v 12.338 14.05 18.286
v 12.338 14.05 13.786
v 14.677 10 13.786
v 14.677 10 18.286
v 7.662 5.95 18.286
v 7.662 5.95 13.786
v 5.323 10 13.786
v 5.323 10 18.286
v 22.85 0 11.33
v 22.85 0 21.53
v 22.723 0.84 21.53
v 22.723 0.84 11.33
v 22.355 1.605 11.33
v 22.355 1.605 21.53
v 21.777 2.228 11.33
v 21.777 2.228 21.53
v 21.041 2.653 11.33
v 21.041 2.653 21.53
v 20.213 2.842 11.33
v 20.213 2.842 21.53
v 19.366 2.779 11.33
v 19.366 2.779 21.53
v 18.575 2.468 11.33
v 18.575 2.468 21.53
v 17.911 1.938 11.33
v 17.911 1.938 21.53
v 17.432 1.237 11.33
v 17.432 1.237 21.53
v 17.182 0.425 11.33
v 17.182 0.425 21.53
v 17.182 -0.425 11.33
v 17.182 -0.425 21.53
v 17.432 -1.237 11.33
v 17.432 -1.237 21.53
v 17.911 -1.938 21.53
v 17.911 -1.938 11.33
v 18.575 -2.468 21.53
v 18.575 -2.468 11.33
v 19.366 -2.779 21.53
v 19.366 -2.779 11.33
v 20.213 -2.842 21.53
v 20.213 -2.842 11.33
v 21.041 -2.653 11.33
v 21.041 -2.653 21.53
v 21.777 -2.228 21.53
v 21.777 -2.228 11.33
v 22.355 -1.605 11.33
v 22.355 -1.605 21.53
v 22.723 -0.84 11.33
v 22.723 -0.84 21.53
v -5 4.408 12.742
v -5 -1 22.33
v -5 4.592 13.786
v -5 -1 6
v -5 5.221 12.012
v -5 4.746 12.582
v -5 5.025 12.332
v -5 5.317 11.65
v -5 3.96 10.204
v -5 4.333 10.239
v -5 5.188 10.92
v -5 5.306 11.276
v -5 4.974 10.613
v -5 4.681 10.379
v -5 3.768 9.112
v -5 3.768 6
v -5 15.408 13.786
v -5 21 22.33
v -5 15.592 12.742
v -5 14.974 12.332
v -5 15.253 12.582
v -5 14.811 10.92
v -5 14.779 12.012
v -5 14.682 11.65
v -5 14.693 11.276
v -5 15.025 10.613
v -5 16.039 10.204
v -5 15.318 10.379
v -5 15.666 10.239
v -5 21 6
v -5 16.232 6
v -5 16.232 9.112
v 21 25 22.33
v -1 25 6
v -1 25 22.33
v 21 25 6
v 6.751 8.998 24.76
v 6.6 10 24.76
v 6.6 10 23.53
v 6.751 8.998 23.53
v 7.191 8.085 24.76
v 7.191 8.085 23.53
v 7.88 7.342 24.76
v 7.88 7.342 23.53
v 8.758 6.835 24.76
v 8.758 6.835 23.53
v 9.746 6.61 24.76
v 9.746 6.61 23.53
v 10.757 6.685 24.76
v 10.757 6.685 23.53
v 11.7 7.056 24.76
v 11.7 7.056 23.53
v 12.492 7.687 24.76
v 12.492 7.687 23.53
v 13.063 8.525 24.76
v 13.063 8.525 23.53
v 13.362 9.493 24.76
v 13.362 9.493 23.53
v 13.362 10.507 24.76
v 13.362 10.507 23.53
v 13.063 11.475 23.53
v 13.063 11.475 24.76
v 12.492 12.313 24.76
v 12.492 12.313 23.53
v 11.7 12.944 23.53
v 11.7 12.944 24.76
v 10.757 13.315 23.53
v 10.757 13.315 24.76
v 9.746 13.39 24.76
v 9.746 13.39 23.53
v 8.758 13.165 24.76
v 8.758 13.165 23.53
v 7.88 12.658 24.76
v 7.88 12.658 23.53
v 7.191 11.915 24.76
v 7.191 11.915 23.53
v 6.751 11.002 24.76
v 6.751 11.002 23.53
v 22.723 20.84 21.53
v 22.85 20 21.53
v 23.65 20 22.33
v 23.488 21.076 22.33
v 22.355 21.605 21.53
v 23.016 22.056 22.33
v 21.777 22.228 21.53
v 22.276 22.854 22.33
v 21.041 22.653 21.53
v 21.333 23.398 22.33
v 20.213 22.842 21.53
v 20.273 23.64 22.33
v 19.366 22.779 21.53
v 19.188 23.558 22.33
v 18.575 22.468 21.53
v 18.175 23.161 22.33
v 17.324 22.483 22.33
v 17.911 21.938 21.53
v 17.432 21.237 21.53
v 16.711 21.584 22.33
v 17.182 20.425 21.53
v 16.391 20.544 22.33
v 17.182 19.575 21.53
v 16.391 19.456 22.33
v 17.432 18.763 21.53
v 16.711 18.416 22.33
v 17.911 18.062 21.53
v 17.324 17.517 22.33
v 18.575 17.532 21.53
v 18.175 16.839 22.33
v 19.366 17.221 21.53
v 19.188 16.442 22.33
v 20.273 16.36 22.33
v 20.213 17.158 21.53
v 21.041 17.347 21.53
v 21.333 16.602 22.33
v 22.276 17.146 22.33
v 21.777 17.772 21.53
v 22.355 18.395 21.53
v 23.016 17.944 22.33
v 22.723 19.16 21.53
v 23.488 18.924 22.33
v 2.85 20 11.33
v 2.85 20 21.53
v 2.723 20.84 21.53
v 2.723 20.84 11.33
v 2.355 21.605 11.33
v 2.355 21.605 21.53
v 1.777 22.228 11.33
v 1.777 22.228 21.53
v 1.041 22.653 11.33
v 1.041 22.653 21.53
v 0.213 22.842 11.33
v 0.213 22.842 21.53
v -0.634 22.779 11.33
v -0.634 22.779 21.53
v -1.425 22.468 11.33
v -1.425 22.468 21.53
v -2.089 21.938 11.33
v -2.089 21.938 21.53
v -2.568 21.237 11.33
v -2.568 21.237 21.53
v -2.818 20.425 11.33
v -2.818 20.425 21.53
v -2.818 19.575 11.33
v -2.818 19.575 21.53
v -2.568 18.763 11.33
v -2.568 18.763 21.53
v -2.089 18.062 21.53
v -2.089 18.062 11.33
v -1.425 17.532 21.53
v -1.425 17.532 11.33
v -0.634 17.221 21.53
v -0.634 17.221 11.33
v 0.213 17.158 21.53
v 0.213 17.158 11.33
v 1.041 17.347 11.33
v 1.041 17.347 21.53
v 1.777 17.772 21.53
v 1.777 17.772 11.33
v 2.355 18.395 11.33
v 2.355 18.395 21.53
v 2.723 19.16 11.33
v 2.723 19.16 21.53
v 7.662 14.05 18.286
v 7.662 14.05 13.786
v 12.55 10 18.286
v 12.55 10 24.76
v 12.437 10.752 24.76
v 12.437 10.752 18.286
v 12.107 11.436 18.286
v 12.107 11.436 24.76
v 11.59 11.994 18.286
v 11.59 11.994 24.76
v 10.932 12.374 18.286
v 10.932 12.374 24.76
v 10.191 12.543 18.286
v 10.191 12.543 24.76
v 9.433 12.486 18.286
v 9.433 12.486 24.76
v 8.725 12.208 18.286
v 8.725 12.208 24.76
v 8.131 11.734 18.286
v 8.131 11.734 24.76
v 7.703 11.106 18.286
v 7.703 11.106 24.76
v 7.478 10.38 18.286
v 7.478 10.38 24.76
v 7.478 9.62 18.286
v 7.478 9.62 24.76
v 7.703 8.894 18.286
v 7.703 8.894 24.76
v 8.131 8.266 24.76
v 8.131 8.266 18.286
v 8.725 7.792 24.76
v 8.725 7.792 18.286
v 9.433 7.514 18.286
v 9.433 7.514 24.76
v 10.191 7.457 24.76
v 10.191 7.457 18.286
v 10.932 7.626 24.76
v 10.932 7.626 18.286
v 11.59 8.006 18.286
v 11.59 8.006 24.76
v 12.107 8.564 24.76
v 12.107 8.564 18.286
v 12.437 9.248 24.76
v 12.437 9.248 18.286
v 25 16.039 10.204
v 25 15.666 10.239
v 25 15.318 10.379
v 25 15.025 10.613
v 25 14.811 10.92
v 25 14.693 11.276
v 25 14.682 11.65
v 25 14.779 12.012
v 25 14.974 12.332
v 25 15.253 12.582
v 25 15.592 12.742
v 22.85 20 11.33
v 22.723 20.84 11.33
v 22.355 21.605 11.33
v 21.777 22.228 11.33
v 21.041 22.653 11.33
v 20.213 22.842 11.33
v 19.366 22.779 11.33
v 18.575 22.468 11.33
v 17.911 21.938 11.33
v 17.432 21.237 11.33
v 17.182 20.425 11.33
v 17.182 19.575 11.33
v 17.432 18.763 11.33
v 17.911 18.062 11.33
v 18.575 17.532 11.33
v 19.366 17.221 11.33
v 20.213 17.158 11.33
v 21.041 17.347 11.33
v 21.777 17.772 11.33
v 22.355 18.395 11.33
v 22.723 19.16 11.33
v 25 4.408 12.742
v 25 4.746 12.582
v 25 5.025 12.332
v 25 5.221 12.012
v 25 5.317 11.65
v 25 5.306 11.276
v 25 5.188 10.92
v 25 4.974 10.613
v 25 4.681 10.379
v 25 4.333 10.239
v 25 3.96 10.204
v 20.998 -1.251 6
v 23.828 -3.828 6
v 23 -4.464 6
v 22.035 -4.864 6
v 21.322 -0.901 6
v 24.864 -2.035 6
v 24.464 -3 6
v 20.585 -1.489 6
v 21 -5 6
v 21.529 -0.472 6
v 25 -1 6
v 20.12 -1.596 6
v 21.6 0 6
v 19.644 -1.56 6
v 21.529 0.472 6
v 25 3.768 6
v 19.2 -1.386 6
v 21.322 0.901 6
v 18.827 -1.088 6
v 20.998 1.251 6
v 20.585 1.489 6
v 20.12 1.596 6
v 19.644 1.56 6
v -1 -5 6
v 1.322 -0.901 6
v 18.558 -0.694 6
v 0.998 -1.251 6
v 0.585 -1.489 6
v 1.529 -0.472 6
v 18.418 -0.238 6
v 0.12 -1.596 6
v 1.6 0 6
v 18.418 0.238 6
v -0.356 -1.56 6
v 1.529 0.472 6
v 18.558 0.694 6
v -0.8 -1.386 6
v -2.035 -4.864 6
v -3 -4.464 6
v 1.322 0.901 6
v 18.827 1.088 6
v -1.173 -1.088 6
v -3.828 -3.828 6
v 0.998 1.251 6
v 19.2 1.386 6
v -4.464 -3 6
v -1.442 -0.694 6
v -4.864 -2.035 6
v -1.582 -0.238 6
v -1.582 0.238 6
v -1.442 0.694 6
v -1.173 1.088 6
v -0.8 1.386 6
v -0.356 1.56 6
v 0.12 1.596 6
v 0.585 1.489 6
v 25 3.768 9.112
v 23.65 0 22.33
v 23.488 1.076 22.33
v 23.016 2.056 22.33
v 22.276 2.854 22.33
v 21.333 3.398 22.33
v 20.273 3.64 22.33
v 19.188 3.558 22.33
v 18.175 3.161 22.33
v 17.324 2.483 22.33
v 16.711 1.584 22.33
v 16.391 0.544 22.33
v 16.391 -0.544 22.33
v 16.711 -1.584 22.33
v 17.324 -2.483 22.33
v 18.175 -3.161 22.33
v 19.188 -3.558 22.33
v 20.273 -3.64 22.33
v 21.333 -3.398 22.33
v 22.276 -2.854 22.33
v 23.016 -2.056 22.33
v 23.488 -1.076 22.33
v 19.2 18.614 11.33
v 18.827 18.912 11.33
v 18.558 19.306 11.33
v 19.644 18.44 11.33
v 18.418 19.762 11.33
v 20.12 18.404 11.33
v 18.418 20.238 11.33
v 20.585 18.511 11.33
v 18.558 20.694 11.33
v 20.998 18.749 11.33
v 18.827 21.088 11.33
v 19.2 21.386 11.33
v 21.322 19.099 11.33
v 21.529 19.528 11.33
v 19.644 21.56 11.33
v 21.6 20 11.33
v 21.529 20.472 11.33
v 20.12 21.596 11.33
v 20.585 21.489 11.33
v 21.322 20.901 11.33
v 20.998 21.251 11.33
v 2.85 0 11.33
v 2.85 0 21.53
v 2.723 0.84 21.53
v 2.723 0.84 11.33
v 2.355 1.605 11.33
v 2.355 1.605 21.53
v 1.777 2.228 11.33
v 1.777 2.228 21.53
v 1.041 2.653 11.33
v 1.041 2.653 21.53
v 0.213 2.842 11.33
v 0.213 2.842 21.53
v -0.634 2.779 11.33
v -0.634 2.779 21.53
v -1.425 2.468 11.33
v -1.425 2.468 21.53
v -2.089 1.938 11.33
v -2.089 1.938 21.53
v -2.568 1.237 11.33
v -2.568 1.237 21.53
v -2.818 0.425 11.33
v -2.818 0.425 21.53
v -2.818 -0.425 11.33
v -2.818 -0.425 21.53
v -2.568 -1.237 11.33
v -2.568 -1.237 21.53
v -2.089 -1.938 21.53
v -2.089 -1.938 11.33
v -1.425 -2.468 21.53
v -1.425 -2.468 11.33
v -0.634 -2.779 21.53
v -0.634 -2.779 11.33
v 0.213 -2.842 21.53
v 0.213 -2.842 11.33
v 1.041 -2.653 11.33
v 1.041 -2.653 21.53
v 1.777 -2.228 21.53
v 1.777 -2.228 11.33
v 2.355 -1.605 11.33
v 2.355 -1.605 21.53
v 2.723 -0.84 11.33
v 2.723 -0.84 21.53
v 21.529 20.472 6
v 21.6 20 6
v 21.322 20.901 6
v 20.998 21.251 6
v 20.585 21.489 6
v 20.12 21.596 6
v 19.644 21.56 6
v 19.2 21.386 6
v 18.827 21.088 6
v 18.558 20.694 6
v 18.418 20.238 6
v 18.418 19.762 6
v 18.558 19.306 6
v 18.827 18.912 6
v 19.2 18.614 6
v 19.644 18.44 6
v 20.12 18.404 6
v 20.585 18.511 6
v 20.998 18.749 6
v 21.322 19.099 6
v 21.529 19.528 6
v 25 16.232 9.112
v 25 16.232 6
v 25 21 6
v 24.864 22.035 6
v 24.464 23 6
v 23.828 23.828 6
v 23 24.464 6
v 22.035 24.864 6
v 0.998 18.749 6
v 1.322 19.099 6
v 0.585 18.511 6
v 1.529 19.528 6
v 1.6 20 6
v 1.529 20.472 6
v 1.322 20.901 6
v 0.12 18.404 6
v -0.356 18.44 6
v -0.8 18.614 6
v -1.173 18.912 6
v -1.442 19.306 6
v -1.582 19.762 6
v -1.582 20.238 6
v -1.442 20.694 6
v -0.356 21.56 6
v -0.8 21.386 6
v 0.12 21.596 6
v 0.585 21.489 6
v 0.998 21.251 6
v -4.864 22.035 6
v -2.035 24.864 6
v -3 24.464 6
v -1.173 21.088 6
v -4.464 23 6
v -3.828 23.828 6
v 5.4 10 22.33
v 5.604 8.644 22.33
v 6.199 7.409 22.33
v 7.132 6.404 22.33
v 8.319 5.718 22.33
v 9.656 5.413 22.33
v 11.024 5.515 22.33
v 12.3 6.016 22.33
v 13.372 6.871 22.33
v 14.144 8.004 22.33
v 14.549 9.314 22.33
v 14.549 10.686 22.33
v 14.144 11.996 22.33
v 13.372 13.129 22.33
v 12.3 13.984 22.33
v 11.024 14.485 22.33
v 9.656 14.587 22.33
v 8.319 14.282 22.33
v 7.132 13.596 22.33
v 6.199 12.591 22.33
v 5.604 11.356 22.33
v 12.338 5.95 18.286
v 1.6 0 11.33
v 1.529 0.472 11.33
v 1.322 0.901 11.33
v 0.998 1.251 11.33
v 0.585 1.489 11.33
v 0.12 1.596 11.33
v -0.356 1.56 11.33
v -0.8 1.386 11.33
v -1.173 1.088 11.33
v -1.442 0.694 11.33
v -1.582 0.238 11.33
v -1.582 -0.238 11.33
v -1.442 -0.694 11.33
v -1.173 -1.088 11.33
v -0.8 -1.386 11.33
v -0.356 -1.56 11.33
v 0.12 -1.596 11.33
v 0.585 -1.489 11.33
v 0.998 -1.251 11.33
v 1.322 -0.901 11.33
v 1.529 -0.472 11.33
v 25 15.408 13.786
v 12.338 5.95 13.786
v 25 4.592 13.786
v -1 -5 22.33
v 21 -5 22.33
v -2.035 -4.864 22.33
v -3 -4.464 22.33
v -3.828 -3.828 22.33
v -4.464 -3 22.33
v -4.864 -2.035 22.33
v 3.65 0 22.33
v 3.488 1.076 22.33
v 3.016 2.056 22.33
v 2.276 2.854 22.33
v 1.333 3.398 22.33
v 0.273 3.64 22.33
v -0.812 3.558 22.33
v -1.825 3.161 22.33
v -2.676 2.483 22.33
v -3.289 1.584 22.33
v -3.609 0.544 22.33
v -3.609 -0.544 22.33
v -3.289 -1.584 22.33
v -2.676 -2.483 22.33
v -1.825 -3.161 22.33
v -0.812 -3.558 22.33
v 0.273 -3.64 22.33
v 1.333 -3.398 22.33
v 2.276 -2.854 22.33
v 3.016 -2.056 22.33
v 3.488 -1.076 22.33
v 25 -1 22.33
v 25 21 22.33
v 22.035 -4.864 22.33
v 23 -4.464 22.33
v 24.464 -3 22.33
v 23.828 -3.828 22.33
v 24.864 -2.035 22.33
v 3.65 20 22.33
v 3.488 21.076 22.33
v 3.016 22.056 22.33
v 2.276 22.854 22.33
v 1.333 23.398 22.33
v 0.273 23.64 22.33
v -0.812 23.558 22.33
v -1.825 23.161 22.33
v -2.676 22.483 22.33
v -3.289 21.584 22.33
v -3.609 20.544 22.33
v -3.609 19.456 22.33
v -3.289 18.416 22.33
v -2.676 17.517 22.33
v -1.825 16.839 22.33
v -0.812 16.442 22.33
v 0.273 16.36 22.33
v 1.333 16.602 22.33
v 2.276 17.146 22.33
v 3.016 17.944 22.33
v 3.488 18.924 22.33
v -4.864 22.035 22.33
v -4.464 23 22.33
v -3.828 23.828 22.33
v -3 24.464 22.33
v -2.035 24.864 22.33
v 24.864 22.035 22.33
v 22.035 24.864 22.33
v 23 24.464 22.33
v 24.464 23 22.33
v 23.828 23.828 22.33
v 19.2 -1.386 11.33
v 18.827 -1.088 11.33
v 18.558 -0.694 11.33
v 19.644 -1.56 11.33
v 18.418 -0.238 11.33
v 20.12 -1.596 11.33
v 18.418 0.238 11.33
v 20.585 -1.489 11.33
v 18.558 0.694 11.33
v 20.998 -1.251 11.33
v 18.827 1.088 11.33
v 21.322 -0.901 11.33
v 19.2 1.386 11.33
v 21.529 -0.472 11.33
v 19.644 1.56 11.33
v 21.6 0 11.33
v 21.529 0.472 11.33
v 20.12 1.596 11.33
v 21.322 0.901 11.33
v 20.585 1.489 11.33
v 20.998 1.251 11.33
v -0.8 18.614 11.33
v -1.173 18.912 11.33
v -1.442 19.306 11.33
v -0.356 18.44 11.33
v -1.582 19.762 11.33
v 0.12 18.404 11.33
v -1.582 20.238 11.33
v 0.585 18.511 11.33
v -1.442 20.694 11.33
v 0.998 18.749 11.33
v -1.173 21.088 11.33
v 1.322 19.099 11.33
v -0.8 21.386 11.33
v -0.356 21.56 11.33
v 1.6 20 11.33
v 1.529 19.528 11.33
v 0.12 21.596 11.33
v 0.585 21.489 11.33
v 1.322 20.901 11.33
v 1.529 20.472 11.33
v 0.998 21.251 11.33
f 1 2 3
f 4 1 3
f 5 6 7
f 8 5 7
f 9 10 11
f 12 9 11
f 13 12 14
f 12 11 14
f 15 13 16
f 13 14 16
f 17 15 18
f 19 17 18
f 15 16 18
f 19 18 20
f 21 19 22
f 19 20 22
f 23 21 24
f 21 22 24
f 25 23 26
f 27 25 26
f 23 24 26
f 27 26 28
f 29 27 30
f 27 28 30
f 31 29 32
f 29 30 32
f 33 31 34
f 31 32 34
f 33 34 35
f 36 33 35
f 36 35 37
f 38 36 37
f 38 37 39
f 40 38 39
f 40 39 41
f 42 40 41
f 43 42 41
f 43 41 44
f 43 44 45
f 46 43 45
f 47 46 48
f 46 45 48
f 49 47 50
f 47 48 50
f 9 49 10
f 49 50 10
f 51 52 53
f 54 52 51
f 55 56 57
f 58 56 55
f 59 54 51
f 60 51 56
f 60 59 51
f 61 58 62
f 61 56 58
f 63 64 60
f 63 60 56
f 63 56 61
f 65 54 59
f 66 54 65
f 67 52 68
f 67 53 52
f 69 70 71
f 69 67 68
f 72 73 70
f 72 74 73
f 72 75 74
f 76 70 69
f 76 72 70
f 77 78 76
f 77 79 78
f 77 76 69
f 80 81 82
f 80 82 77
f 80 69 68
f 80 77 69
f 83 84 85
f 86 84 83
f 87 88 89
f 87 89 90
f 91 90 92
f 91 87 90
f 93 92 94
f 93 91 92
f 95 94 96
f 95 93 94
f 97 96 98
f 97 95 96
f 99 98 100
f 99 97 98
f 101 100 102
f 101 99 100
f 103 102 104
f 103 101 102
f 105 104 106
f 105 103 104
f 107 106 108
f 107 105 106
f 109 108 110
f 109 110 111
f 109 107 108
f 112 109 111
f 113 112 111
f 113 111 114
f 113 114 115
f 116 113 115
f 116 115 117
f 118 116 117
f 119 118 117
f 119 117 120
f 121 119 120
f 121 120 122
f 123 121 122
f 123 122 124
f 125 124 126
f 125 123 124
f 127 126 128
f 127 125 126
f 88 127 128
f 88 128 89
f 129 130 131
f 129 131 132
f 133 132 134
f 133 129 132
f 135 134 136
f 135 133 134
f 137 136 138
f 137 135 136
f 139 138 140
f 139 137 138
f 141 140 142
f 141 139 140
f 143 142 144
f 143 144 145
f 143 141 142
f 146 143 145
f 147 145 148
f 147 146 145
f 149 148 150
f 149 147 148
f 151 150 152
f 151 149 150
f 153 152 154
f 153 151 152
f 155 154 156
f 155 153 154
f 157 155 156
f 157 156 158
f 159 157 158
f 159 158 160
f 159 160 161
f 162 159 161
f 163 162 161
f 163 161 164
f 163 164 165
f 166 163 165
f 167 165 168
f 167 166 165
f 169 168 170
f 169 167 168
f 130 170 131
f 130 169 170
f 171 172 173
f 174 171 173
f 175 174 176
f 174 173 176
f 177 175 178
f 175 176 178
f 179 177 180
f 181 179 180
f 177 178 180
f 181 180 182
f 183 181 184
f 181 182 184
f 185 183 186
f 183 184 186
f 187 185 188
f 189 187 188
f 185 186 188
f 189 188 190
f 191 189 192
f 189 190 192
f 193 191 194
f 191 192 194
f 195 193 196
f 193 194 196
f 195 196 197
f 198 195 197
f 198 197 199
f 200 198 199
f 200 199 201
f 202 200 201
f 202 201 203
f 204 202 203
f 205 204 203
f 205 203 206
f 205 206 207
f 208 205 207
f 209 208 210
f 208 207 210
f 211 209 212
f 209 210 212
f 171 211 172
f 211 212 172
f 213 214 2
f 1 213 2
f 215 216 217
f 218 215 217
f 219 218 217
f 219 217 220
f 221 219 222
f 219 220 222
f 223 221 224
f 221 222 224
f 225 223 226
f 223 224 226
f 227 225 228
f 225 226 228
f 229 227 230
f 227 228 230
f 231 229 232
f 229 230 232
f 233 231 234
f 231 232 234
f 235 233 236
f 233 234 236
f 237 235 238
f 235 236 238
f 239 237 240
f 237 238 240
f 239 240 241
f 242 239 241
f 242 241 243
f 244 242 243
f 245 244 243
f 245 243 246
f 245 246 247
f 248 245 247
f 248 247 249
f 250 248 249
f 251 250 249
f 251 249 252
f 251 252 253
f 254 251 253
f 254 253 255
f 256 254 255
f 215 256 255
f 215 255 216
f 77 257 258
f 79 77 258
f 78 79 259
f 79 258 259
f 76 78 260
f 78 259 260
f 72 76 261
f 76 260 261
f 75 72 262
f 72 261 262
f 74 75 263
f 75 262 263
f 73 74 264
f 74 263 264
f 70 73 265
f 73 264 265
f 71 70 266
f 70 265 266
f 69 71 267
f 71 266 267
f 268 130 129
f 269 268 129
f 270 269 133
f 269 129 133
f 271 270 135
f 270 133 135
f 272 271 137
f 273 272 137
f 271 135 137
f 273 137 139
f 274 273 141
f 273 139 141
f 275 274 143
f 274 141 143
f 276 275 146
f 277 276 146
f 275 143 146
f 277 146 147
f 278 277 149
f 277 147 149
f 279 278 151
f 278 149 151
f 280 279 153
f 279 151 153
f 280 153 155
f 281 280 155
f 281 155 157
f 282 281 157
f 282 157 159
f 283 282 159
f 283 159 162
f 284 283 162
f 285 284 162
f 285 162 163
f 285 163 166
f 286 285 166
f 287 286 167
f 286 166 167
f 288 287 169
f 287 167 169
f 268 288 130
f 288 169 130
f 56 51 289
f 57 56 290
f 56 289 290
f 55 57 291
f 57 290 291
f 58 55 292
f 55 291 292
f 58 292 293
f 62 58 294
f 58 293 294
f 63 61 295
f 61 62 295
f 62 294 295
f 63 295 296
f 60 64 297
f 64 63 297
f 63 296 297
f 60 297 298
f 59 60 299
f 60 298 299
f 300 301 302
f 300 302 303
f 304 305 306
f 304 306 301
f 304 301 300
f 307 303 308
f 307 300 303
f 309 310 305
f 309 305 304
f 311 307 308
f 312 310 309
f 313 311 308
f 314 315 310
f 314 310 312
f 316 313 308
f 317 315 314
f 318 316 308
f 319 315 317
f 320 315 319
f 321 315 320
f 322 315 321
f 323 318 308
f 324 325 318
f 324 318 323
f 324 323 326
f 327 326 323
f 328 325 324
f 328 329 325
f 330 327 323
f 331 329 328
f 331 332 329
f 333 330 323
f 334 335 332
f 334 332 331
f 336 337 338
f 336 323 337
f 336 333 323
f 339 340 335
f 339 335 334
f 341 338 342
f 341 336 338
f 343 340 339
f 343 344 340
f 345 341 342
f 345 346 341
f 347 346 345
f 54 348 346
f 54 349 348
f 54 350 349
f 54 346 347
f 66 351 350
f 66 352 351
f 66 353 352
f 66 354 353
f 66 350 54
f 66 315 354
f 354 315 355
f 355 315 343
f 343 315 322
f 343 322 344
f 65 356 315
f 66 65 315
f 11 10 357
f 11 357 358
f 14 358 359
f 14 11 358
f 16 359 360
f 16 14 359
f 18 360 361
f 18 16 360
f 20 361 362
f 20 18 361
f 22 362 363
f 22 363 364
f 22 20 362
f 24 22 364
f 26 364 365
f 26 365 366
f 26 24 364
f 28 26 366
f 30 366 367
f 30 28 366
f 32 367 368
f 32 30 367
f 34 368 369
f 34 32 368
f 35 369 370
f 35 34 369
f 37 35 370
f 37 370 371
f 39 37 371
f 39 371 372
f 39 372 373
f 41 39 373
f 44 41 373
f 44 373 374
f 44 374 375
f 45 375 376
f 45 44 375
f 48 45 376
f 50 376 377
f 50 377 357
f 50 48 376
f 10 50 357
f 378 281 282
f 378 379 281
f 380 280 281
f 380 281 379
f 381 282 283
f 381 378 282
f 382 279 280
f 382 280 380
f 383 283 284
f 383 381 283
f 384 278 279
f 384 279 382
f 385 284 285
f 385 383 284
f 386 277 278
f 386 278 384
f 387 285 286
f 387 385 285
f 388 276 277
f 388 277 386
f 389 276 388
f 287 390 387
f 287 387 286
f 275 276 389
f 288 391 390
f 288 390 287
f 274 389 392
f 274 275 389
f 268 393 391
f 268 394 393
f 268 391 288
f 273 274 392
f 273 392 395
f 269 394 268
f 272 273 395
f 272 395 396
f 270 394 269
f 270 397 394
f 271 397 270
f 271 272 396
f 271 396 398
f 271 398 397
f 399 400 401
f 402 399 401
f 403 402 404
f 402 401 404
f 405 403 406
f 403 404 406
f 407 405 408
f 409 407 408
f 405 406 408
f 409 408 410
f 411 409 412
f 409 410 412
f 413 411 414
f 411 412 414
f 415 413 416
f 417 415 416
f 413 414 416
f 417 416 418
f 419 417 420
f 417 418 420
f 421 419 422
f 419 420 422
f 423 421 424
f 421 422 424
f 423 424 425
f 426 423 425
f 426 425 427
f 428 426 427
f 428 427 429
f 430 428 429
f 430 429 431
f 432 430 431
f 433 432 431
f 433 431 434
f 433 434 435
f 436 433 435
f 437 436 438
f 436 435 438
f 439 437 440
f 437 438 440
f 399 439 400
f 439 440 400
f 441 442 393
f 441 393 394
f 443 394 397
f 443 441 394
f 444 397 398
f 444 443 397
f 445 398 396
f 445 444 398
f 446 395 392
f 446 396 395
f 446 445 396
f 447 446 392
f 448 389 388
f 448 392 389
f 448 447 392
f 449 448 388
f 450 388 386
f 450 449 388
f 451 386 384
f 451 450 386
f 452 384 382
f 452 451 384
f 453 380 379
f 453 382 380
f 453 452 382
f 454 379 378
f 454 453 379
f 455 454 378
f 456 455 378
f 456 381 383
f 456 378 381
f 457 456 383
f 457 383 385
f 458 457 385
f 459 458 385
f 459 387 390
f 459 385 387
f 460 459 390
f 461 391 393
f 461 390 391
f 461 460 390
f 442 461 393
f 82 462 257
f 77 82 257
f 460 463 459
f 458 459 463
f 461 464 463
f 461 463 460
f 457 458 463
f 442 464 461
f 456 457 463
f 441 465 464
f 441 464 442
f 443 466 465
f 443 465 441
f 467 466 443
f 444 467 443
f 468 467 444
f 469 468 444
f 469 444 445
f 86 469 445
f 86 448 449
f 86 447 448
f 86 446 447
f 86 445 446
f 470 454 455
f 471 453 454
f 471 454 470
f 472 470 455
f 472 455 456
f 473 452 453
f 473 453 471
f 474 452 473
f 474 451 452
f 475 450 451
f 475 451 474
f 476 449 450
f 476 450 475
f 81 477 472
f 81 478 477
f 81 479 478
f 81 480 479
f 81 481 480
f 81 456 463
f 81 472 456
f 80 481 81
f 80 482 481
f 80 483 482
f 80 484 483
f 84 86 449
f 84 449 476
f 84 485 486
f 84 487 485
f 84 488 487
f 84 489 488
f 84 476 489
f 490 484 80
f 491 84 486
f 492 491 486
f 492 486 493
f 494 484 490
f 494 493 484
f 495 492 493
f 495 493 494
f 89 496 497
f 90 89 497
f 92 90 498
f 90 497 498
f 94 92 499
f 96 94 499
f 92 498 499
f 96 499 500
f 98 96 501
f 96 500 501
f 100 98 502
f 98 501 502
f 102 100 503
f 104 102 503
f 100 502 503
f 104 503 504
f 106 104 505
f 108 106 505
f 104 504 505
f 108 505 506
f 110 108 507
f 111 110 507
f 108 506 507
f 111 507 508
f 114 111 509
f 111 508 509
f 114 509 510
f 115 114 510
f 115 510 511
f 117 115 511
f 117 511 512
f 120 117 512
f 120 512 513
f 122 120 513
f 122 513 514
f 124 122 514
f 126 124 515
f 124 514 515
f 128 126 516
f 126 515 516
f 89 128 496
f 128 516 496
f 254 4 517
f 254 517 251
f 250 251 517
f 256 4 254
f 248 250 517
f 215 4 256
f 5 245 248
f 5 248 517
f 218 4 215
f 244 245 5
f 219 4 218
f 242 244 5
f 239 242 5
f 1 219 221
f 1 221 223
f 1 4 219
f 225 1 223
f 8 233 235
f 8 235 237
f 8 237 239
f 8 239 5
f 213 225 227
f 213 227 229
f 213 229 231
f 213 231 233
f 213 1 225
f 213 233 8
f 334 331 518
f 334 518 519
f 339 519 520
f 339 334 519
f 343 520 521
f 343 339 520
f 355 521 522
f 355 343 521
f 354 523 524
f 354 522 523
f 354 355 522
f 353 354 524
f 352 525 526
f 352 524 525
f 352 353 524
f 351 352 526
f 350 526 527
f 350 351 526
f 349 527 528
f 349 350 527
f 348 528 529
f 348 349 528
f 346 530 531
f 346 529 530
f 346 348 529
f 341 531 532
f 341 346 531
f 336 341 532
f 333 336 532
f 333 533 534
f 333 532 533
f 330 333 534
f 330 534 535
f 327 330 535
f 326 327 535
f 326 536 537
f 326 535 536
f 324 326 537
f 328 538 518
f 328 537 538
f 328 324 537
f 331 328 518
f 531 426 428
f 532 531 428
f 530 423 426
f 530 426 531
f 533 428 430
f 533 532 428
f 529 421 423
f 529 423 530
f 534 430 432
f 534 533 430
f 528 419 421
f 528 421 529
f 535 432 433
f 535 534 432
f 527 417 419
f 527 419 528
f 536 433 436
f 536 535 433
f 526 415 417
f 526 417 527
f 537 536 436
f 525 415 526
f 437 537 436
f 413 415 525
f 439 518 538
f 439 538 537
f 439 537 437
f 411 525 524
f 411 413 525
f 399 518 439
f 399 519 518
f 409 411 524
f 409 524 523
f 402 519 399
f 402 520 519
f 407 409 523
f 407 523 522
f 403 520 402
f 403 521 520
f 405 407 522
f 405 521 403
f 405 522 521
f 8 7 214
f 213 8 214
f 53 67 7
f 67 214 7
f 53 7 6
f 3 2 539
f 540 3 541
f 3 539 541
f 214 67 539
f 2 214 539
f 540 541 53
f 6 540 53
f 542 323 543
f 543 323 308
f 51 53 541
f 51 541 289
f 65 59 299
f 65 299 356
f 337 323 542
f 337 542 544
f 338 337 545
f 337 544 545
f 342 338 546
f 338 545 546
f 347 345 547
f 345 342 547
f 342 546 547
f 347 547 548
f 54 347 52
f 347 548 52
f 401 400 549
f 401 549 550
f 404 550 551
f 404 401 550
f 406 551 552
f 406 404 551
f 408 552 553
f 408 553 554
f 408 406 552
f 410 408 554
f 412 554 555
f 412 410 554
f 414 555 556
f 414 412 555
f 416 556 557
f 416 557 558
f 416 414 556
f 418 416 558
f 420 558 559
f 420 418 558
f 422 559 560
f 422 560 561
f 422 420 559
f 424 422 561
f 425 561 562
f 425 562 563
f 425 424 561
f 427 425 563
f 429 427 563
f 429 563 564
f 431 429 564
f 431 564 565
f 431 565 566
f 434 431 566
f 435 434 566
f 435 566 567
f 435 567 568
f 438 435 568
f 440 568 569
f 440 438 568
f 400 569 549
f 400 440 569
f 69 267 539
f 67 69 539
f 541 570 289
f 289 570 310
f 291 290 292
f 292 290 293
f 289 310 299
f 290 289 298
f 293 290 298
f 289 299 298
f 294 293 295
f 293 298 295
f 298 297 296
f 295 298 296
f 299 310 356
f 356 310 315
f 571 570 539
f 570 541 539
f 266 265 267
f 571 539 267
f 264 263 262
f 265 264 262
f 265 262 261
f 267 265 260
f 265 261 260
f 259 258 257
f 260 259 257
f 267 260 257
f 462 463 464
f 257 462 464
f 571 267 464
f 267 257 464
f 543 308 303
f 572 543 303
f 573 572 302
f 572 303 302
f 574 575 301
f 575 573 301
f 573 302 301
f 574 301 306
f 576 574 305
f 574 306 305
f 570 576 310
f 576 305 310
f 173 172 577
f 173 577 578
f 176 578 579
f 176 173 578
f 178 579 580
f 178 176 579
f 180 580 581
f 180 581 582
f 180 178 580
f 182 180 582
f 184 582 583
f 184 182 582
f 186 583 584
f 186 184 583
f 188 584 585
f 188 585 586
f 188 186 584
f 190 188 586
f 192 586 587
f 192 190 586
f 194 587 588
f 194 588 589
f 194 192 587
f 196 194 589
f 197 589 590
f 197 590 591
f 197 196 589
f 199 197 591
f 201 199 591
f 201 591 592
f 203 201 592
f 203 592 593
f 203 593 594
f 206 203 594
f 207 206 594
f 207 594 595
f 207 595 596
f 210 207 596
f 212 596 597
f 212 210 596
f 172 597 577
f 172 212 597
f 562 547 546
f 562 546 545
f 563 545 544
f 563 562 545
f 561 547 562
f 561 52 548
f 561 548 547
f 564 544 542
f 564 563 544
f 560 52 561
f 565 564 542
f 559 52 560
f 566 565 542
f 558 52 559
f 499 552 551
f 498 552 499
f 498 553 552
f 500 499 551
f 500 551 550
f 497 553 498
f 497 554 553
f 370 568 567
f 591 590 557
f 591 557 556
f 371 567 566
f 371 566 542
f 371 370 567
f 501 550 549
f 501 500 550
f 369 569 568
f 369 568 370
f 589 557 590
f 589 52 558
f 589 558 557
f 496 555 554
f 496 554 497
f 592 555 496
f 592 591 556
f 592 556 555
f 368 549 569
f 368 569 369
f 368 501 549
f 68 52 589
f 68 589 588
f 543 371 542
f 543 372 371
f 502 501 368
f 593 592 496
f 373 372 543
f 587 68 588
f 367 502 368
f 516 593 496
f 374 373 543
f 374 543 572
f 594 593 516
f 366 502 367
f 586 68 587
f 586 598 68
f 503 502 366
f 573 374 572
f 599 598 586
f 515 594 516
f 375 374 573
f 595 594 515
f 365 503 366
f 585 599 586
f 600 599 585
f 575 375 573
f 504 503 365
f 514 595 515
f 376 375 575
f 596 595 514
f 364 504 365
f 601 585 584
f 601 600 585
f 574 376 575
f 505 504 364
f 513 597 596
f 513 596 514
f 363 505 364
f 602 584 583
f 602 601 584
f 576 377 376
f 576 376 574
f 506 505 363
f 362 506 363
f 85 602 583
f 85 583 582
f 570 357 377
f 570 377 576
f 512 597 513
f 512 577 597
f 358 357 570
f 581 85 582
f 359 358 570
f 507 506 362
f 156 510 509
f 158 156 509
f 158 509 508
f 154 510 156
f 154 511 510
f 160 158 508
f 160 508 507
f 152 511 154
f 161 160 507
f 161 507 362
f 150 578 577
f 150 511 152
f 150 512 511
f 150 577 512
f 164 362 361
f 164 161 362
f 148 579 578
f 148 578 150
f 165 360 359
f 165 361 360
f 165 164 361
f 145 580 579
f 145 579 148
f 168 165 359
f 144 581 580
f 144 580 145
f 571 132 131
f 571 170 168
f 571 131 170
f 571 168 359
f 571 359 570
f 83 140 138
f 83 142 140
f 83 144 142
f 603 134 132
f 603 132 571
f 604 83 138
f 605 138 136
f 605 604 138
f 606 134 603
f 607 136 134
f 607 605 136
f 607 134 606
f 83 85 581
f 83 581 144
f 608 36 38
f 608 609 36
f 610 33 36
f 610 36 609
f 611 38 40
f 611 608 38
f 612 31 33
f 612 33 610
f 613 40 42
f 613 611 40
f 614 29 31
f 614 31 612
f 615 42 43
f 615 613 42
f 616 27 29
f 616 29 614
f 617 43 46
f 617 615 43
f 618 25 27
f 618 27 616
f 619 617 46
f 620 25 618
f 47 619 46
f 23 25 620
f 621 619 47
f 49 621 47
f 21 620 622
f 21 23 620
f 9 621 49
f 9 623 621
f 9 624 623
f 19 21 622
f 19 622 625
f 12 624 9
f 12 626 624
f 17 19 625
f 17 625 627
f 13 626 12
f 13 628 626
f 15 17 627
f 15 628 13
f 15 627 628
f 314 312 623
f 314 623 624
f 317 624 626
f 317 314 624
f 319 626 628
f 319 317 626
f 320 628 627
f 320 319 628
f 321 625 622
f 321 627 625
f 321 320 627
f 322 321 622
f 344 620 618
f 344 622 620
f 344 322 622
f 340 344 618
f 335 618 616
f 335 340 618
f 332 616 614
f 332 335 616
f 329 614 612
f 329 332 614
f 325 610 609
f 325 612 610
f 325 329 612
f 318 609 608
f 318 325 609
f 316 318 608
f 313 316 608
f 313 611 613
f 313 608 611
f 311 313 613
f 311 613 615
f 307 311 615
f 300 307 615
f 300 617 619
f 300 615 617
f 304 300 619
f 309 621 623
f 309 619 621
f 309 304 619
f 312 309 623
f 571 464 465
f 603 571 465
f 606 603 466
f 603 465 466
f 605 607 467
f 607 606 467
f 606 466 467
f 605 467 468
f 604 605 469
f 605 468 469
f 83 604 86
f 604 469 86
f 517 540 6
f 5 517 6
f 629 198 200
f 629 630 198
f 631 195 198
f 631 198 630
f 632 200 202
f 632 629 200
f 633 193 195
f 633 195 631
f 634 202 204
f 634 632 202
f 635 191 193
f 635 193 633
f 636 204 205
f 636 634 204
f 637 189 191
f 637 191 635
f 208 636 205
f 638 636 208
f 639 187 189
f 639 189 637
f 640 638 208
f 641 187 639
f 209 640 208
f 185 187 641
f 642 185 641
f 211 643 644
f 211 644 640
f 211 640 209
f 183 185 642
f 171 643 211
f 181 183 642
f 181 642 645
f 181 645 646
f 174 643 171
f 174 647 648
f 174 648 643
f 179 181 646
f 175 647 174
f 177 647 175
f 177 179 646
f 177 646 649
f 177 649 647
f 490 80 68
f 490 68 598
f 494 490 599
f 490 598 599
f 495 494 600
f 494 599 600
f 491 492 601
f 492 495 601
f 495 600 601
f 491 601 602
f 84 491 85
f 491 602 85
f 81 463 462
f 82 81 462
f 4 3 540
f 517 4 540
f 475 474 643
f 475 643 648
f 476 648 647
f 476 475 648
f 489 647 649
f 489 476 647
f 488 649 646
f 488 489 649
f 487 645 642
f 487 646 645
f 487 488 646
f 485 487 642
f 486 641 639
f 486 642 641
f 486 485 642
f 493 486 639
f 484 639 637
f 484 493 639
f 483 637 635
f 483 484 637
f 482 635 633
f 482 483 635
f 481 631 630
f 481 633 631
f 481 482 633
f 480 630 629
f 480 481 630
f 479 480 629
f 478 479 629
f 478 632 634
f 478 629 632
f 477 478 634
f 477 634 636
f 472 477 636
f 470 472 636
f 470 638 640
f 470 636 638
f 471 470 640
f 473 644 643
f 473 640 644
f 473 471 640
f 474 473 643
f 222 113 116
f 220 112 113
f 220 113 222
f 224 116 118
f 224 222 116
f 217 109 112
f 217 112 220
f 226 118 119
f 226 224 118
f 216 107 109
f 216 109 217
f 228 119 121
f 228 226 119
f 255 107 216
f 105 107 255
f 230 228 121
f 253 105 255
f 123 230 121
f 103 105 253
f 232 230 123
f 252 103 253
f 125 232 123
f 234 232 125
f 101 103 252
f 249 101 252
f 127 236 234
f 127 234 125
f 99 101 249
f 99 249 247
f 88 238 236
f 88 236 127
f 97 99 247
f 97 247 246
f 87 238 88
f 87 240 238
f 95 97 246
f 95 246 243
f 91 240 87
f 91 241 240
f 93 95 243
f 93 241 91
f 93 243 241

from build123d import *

# Parameters (mm, degrees)
SKETCH1_W                  = 30
SKETCH1_H                  = 30
SKETCH1_R                  = 1.6
SKETCH1_W_2                = 70
SKETCH1_H_2                = 12
BOSS_EXTRUDE1_DEPTH        = 6
SKETCH1_3_W                = 30
SKETCH1_3_H                = 30
SKETCH1_3_R                = 1.6
BOSS_EXTRUDE2_DEPTH        = 22.33
CUT_EXTRUDE1_DEPTH         = 78.612040947
SKETCH3_R                  = 2.55
CUT_EXTRUDE2_DEPTH         = 8
CUT_EXTRUDE3_DEPTH         = 4.5
SKETCH6_R                  = 5
CUT_EXTRUDE5_DEPTH         = 8.6
SKETCH7_R                  = 1.6
CUT_EXTRUDE6_DEPTH         = 101.740403513
SKETCH8_R                  = 2.85
CUT_EXTRUDE7_DEPTH         = 11
BOSS_EXTRUDE3_START        = 2.43
SKETCH9_R                  = 3.4
SKETCH9_R_2                = 2.55
BOSS_EXTRUDE3_DEPTH        = 2.43
CHAMFER1_SIZE              = 1.2
FILLET3_R                  = 4
CHAMFER2_SIZE              = 0.8
CUT_EXTRUDE8_DEPTH         = 3
CHAMFER3_SIZE              = 0.8
LPATTERN1_COUNT            = 3
LPATTERN1_PITCH            = 25
CHAMFER3_OF_LPATTERN1_SIZE = 0.8
SKETCH12_W                 = 103.210606925
SKETCH12_H                 = 33.832940417
CUT_EXTRUDE9_DEPTH         = 6


with BuildPart() as part:
    # Sketch1 → Boss-Extrude1 (new body)
    # profile 1 of 2: a face of its own
    with BuildSketch(Plane.XY):
        with Locations((10, 10)):
            Rectangle(SKETCH1_W, SKETCH1_H)
        with Locations((20, 0)):
            Circle(SKETCH1_R, mode=Mode.SUBTRACT)
        with Locations((20, 20)):
            Circle(SKETCH1_R, mode=Mode.SUBTRACT)
        with Locations((0, 20)):
            Circle(SKETCH1_R, mode=Mode.SUBTRACT)
        Circle(SKETCH1_R, mode=Mode.SUBTRACT)
    # profile 2 of 2: a face of its own
    with BuildSketch(Plane.XY):
        with Locations((60, 10)):
            Rectangle(SKETCH1_W_2, SKETCH1_H_2)
    extrude(amount=BOSS_EXTRUDE1_DEPTH)

    # Sketch1<3> → Boss-Extrude2 (add)
    with BuildSketch(Plane.XY):
        with Locations((10, 10)):
            Rectangle(SKETCH1_3_W, SKETCH1_3_H)
        with Locations((20, 0)):
            Circle(SKETCH1_3_R, mode=Mode.SUBTRACT)
        with Locations((20, 20)):
            Circle(SKETCH1_3_R, mode=Mode.SUBTRACT)
        with Locations((0, 20)):
            Circle(SKETCH1_3_R, mode=Mode.SUBTRACT)
        Circle(SKETCH1_3_R, mode=Mode.SUBTRACT)
    extrude(amount=BOSS_EXTRUDE2_DEPTH)

    # Sketch2 → Cut-Extrude1 (cut, through all)
    with BuildSketch(Plane(origin=(25, 0, 0), x_dir=(0, 0, -1), z_dir=(1, 0, 0))):
        with BuildLine():
            Line((-6.515476918, 16.231667643), (-9.112158418, 16.231667643))
            Line((-9.112158418, 16.231667643), (-10.20449761, 16.039058771))
            ThreePointArc((-10.20449761, 16.039058771), (-11.275650893, 14.693383456), (-12.742453793, 15.59154862))
            Line((-12.742453793, 15.59154862), (-13.786185118, 15.407510627))
            Line((-13.786185118, 15.407510627), (-13.786185118, 4.591753459))
            Line((-13.786185118, 4.591753459), (-12.742453793, 4.407715465))
            ThreePointArc((-12.742453793, 4.407715465), (-11.275650893, 5.305880629), (-10.20449761, 3.960205314))
            Line((-10.20449761, 3.960205314), (-9.112158418, 3.767596443))
            Line((-9.112158418, 3.767596443), (-6.515476918, 3.767596443))
            Line((-6.515476918, 3.767596443), (-5.902540869, 3.767596443))
            Line((-5.902540869, 3.767596443), (-5.902540869, 16.231667643))
            Line((-5.902540869, 16.231667643), (-6.515476918, 16.231667643))
        make_face()
    extrude(amount=-CUT_EXTRUDE1_DEPTH, mode=Mode.SUBTRACT)

    # Sketch3 → Cut-Extrude2 (cut)
    with BuildSketch(Plane.XY.offset(22.33)):
        with Locations((10, 10)):
            Circle(SKETCH3_R)
    extrude(amount=-CUT_EXTRUDE2_DEPTH, mode=Mode.SUBTRACT)

    # Sketch5 → Cut-Extrude3 (cut)
    with BuildSketch(Plane(origin=(0, 0, 13.786185118), x_dir=(-1, 0, 0), z_dir=(0, 0, -1))):
        Polygon((-5.32346282, 10), (-7.66173141, 14.05), (-12.33826859, 14.05), (-14.67653718, 10), (-12.33826859, 5.95), (-7.66173141, 5.95), align=None)
    extrude(amount=-CUT_EXTRUDE3_DEPTH, mode=Mode.SUBTRACT)

    # Sketch6 → Cut-Extrude5 (cut)
    with BuildSketch(Plane(origin=(0, 0, 0), x_dir=(-1, 0, 0), z_dir=(0, 0, -1))):
        with Locations((-10, 10)):
            Circle(SKETCH6_R)
    extrude(amount=-CUT_EXTRUDE5_DEPTH, mode=Mode.SUBTRACT)

    # Sketch7 → Cut-Extrude6 (cut, through all)
    with BuildSketch(Plane(origin=(0, 0, 0), x_dir=(-1, 0, 0), z_dir=(0, 0, -1))):
        with BuildLine():
            ThreePointArc((-90.1, 10), (-88.5, 8.4), (-86.9, 10))
            Line((-86.9, 10), (-90.1, 10))
        make_face()
        with BuildLine():
            Line((-90.1, 10), (-86.9, 10))
            ThreePointArc((-86.9, 10), (-88.5, 11.6), (-90.1, 10))
        make_face()
        with Locations((-63.5, 10)):
            Circle(SKETCH7_R)
        with Locations((-38.5, 10)):
            Circle(SKETCH7_R)
    extrude(amount=-CUT_EXTRUDE6_DEPTH, mode=Mode.SUBTRACT)

    # Sketch8 → Cut-Extrude7 (cut)
    with BuildSketch(Plane.XY.offset(22.33)):
        with Locations((20, 20)):
            Circle(SKETCH8_R)
        with Locations((20, 0)):
            Circle(SKETCH8_R)
        Circle(SKETCH8_R)
        with Locations((0, 20)):
            Circle(SKETCH8_R)
    extrude(amount=-CUT_EXTRUDE7_DEPTH, mode=Mode.SUBTRACT)

    # Sketch9 → Boss-Extrude3 (add)
    with BuildSketch(Plane.XY.offset(22.33).offset(BOSS_EXTRUDE3_START)):
        with Locations(Location((10, 10, 0), (0, 0, 180))):
            Circle(SKETCH9_R)
        with Locations((10, 10)):
            Circle(SKETCH9_R_2, mode=Mode.SUBTRACT)
    extrude(amount=-BOSS_EXTRUDE3_DEPTH)

    # Chamfer1
    chamfer1_edges = [part.edges().sort_by_distance(p)[0] for p in [
        (13.4, 10, 22.33),
    ]]
    chamfer(chamfer1_edges, length=CHAMFER1_SIZE)

    # Fillet3
    # the kernel refuses this fillet: 4 mm, written as the material it adds along each edge
    with BuildSketch(Plane(origin=(25, 4, 0), x_dir=(0, -1, 0), z_dir=(0, 0, 1))) as fillet3_piece_1:
        with BuildLine():
            CenterArc((FILLET3_R, FILLET3_R), FILLET3_R, 180, 90)
            Line((0, FILLET3_R), (0, 0))
            Line((0, 0), (FILLET3_R, 0))
        make_face()
    extrude(amount=5.902540869)
    with BuildSketch(Plane(origin=(25, 16, 0), x_dir=(0, 1, 0), z_dir=(0, 0, 1))) as fillet3_piece_2:
        with BuildLine():
            CenterArc((FILLET3_R, -FILLET3_R), FILLET3_R, 90, 90)
            Line((0, -FILLET3_R), (0, 0))
            Line((0, 0), (FILLET3_R, 0))
        make_face()
    extrude(amount=5.902540869)
    # the kernel refuses this fillet: 4 mm, written as the material it takes off along each edge
    with BuildSketch(Plane(origin=(-5, -5, 32.33), x_dir=(1, 0, 0), z_dir=(0, 0, -1)), Plane(origin=(-5, 25, 32.33), x_dir=(0, -1, 0), z_dir=(0, 0, -1)), Plane(origin=(25, 25, -10), x_dir=(0, -1, 0), z_dir=(0, 0, 1)), Plane(origin=(25, -5, -10), x_dir=(-1, 0, 0), z_dir=(0, 0, 1))) as fillet3_2_piece_1:
        with BuildLine():
            CenterArc((FILLET3_R, -FILLET3_R), FILLET3_R, 90, 90)
            Line((0, -FILLET3_R), (0, 0))
            Line((0, 0), (FILLET3_R, 0))
        make_face()
    extrude(amount=42.33, mode=Mode.SUBTRACT)
    with BuildSketch(Plane(origin=(95, 16, -10), x_dir=(-1, 0, 0), z_dir=(0, 0, 1))) as fillet3_2_piece_2:
        with BuildLine():
            CenterArc((FILLET3_R, FILLET3_R), FILLET3_R, 180, 90)
            Line((0, FILLET3_R), (0, 0))
            Line((0, 0), (FILLET3_R, 0))
        make_face()
    extrude(amount=26, mode=Mode.SUBTRACT)
    with BuildSketch(Plane(origin=(95, 4, -10), x_dir=(-1, 0, 0), z_dir=(0, 0, 1))) as fillet3_2_piece_3:
        with BuildLine():
            CenterArc((FILLET3_R, -FILLET3_R), FILLET3_R, 90, 90)
            Line((0, -FILLET3_R), (0, 0))
            Line((0, 0), (FILLET3_R, 0))
        make_face()
    extrude(amount=26, mode=Mode.SUBTRACT)

    # Chamfer2
    chamfer2_edges = [part.edges().sort_by_distance(p)[0] for p in [
        (-2.85, 20, 22.33),
        (-2.85, 0, 22.33),
        (17.15, 0, 22.33),
        (17.15, 20, 22.33),
    ]]
    chamfer(chamfer2_edges, length=CHAMFER2_SIZE)

    # Sketch10 → Cut-Extrude8 (cut)
    with BuildSketch(Plane(origin=(0, 0, 0), x_dir=(-1, 0, 0), z_dir=(0, 0, -1))):
        Polygon((-85.266838493, 10), (-86.883419246, 12.8), (-90.116580754, 12.8), (-91.733161507, 10), (-90.116580754, 7.2), (-86.883419246, 7.2), align=None)
    cut_extrude8 = extrude(amount=-CUT_EXTRUDE8_DEPTH, mode=Mode.SUBTRACT)

    # Chamfer3
    chamfer3_edges = [part.edges().sort_by_distance(p)[0] for p in [
        (86.075128869, 8.6, 0),
        (86.075128869, 11.4, 0),
        (88.5, 12.8, 0),
        (90.924871131, 11.4, 0),
        (90.924871131, 8.6, 0),
        (88.5, 7.2, 0),
    ]]
    chamfer(chamfer3_edges, length=CHAMFER3_SIZE)

    # LPattern1: Cut-Extrude8 ×3
    with Locations(*[(-i * LPATTERN1_PITCH, 0, 0) for i in range(1, LPATTERN1_COUNT)]):
        add(cut_extrude8, mode=Mode.SUBTRACT)

    # Chamfer3 of LPattern1
    chamfer3_of_lpattern1_edges = [part.edges().sort_by_distance(p)[0] for p in [
        (61.075128869, 8.6, 0),
        (61.075128869, 11.4, 0),
        (63.5, 12.8, 0),
        (65.924871131, 11.4, 0),
        (65.924871131, 8.6, 0),
        (63.5, 7.2, 0),
        (36.075128869, 8.6, 0),
        (36.075128869, 11.4, 0),
        (38.5, 12.8, 0),
        (40.924871131, 11.4, 0),
        (40.924871131, 8.6, 0),
        (38.5, 7.2, 0),
    ]]
    chamfer(chamfer3_of_lpattern1_edges, length=CHAMFER3_OF_LPATTERN1_SIZE)

    # Sketch12 → Cut-Extrude9 (cut)
    with BuildSketch(Plane(origin=(0, 0, 0), x_dir=(-1, 0, 0), z_dir=(0, 0, -1))):
        with Locations((-45.050346637, 9.848960088)):
            Rectangle(SKETCH12_W, SKETCH12_H)
    extrude(amount=-CUT_EXTRUDE9_DEPTH, mode=Mode.SUBTRACT)


solid = part.part
